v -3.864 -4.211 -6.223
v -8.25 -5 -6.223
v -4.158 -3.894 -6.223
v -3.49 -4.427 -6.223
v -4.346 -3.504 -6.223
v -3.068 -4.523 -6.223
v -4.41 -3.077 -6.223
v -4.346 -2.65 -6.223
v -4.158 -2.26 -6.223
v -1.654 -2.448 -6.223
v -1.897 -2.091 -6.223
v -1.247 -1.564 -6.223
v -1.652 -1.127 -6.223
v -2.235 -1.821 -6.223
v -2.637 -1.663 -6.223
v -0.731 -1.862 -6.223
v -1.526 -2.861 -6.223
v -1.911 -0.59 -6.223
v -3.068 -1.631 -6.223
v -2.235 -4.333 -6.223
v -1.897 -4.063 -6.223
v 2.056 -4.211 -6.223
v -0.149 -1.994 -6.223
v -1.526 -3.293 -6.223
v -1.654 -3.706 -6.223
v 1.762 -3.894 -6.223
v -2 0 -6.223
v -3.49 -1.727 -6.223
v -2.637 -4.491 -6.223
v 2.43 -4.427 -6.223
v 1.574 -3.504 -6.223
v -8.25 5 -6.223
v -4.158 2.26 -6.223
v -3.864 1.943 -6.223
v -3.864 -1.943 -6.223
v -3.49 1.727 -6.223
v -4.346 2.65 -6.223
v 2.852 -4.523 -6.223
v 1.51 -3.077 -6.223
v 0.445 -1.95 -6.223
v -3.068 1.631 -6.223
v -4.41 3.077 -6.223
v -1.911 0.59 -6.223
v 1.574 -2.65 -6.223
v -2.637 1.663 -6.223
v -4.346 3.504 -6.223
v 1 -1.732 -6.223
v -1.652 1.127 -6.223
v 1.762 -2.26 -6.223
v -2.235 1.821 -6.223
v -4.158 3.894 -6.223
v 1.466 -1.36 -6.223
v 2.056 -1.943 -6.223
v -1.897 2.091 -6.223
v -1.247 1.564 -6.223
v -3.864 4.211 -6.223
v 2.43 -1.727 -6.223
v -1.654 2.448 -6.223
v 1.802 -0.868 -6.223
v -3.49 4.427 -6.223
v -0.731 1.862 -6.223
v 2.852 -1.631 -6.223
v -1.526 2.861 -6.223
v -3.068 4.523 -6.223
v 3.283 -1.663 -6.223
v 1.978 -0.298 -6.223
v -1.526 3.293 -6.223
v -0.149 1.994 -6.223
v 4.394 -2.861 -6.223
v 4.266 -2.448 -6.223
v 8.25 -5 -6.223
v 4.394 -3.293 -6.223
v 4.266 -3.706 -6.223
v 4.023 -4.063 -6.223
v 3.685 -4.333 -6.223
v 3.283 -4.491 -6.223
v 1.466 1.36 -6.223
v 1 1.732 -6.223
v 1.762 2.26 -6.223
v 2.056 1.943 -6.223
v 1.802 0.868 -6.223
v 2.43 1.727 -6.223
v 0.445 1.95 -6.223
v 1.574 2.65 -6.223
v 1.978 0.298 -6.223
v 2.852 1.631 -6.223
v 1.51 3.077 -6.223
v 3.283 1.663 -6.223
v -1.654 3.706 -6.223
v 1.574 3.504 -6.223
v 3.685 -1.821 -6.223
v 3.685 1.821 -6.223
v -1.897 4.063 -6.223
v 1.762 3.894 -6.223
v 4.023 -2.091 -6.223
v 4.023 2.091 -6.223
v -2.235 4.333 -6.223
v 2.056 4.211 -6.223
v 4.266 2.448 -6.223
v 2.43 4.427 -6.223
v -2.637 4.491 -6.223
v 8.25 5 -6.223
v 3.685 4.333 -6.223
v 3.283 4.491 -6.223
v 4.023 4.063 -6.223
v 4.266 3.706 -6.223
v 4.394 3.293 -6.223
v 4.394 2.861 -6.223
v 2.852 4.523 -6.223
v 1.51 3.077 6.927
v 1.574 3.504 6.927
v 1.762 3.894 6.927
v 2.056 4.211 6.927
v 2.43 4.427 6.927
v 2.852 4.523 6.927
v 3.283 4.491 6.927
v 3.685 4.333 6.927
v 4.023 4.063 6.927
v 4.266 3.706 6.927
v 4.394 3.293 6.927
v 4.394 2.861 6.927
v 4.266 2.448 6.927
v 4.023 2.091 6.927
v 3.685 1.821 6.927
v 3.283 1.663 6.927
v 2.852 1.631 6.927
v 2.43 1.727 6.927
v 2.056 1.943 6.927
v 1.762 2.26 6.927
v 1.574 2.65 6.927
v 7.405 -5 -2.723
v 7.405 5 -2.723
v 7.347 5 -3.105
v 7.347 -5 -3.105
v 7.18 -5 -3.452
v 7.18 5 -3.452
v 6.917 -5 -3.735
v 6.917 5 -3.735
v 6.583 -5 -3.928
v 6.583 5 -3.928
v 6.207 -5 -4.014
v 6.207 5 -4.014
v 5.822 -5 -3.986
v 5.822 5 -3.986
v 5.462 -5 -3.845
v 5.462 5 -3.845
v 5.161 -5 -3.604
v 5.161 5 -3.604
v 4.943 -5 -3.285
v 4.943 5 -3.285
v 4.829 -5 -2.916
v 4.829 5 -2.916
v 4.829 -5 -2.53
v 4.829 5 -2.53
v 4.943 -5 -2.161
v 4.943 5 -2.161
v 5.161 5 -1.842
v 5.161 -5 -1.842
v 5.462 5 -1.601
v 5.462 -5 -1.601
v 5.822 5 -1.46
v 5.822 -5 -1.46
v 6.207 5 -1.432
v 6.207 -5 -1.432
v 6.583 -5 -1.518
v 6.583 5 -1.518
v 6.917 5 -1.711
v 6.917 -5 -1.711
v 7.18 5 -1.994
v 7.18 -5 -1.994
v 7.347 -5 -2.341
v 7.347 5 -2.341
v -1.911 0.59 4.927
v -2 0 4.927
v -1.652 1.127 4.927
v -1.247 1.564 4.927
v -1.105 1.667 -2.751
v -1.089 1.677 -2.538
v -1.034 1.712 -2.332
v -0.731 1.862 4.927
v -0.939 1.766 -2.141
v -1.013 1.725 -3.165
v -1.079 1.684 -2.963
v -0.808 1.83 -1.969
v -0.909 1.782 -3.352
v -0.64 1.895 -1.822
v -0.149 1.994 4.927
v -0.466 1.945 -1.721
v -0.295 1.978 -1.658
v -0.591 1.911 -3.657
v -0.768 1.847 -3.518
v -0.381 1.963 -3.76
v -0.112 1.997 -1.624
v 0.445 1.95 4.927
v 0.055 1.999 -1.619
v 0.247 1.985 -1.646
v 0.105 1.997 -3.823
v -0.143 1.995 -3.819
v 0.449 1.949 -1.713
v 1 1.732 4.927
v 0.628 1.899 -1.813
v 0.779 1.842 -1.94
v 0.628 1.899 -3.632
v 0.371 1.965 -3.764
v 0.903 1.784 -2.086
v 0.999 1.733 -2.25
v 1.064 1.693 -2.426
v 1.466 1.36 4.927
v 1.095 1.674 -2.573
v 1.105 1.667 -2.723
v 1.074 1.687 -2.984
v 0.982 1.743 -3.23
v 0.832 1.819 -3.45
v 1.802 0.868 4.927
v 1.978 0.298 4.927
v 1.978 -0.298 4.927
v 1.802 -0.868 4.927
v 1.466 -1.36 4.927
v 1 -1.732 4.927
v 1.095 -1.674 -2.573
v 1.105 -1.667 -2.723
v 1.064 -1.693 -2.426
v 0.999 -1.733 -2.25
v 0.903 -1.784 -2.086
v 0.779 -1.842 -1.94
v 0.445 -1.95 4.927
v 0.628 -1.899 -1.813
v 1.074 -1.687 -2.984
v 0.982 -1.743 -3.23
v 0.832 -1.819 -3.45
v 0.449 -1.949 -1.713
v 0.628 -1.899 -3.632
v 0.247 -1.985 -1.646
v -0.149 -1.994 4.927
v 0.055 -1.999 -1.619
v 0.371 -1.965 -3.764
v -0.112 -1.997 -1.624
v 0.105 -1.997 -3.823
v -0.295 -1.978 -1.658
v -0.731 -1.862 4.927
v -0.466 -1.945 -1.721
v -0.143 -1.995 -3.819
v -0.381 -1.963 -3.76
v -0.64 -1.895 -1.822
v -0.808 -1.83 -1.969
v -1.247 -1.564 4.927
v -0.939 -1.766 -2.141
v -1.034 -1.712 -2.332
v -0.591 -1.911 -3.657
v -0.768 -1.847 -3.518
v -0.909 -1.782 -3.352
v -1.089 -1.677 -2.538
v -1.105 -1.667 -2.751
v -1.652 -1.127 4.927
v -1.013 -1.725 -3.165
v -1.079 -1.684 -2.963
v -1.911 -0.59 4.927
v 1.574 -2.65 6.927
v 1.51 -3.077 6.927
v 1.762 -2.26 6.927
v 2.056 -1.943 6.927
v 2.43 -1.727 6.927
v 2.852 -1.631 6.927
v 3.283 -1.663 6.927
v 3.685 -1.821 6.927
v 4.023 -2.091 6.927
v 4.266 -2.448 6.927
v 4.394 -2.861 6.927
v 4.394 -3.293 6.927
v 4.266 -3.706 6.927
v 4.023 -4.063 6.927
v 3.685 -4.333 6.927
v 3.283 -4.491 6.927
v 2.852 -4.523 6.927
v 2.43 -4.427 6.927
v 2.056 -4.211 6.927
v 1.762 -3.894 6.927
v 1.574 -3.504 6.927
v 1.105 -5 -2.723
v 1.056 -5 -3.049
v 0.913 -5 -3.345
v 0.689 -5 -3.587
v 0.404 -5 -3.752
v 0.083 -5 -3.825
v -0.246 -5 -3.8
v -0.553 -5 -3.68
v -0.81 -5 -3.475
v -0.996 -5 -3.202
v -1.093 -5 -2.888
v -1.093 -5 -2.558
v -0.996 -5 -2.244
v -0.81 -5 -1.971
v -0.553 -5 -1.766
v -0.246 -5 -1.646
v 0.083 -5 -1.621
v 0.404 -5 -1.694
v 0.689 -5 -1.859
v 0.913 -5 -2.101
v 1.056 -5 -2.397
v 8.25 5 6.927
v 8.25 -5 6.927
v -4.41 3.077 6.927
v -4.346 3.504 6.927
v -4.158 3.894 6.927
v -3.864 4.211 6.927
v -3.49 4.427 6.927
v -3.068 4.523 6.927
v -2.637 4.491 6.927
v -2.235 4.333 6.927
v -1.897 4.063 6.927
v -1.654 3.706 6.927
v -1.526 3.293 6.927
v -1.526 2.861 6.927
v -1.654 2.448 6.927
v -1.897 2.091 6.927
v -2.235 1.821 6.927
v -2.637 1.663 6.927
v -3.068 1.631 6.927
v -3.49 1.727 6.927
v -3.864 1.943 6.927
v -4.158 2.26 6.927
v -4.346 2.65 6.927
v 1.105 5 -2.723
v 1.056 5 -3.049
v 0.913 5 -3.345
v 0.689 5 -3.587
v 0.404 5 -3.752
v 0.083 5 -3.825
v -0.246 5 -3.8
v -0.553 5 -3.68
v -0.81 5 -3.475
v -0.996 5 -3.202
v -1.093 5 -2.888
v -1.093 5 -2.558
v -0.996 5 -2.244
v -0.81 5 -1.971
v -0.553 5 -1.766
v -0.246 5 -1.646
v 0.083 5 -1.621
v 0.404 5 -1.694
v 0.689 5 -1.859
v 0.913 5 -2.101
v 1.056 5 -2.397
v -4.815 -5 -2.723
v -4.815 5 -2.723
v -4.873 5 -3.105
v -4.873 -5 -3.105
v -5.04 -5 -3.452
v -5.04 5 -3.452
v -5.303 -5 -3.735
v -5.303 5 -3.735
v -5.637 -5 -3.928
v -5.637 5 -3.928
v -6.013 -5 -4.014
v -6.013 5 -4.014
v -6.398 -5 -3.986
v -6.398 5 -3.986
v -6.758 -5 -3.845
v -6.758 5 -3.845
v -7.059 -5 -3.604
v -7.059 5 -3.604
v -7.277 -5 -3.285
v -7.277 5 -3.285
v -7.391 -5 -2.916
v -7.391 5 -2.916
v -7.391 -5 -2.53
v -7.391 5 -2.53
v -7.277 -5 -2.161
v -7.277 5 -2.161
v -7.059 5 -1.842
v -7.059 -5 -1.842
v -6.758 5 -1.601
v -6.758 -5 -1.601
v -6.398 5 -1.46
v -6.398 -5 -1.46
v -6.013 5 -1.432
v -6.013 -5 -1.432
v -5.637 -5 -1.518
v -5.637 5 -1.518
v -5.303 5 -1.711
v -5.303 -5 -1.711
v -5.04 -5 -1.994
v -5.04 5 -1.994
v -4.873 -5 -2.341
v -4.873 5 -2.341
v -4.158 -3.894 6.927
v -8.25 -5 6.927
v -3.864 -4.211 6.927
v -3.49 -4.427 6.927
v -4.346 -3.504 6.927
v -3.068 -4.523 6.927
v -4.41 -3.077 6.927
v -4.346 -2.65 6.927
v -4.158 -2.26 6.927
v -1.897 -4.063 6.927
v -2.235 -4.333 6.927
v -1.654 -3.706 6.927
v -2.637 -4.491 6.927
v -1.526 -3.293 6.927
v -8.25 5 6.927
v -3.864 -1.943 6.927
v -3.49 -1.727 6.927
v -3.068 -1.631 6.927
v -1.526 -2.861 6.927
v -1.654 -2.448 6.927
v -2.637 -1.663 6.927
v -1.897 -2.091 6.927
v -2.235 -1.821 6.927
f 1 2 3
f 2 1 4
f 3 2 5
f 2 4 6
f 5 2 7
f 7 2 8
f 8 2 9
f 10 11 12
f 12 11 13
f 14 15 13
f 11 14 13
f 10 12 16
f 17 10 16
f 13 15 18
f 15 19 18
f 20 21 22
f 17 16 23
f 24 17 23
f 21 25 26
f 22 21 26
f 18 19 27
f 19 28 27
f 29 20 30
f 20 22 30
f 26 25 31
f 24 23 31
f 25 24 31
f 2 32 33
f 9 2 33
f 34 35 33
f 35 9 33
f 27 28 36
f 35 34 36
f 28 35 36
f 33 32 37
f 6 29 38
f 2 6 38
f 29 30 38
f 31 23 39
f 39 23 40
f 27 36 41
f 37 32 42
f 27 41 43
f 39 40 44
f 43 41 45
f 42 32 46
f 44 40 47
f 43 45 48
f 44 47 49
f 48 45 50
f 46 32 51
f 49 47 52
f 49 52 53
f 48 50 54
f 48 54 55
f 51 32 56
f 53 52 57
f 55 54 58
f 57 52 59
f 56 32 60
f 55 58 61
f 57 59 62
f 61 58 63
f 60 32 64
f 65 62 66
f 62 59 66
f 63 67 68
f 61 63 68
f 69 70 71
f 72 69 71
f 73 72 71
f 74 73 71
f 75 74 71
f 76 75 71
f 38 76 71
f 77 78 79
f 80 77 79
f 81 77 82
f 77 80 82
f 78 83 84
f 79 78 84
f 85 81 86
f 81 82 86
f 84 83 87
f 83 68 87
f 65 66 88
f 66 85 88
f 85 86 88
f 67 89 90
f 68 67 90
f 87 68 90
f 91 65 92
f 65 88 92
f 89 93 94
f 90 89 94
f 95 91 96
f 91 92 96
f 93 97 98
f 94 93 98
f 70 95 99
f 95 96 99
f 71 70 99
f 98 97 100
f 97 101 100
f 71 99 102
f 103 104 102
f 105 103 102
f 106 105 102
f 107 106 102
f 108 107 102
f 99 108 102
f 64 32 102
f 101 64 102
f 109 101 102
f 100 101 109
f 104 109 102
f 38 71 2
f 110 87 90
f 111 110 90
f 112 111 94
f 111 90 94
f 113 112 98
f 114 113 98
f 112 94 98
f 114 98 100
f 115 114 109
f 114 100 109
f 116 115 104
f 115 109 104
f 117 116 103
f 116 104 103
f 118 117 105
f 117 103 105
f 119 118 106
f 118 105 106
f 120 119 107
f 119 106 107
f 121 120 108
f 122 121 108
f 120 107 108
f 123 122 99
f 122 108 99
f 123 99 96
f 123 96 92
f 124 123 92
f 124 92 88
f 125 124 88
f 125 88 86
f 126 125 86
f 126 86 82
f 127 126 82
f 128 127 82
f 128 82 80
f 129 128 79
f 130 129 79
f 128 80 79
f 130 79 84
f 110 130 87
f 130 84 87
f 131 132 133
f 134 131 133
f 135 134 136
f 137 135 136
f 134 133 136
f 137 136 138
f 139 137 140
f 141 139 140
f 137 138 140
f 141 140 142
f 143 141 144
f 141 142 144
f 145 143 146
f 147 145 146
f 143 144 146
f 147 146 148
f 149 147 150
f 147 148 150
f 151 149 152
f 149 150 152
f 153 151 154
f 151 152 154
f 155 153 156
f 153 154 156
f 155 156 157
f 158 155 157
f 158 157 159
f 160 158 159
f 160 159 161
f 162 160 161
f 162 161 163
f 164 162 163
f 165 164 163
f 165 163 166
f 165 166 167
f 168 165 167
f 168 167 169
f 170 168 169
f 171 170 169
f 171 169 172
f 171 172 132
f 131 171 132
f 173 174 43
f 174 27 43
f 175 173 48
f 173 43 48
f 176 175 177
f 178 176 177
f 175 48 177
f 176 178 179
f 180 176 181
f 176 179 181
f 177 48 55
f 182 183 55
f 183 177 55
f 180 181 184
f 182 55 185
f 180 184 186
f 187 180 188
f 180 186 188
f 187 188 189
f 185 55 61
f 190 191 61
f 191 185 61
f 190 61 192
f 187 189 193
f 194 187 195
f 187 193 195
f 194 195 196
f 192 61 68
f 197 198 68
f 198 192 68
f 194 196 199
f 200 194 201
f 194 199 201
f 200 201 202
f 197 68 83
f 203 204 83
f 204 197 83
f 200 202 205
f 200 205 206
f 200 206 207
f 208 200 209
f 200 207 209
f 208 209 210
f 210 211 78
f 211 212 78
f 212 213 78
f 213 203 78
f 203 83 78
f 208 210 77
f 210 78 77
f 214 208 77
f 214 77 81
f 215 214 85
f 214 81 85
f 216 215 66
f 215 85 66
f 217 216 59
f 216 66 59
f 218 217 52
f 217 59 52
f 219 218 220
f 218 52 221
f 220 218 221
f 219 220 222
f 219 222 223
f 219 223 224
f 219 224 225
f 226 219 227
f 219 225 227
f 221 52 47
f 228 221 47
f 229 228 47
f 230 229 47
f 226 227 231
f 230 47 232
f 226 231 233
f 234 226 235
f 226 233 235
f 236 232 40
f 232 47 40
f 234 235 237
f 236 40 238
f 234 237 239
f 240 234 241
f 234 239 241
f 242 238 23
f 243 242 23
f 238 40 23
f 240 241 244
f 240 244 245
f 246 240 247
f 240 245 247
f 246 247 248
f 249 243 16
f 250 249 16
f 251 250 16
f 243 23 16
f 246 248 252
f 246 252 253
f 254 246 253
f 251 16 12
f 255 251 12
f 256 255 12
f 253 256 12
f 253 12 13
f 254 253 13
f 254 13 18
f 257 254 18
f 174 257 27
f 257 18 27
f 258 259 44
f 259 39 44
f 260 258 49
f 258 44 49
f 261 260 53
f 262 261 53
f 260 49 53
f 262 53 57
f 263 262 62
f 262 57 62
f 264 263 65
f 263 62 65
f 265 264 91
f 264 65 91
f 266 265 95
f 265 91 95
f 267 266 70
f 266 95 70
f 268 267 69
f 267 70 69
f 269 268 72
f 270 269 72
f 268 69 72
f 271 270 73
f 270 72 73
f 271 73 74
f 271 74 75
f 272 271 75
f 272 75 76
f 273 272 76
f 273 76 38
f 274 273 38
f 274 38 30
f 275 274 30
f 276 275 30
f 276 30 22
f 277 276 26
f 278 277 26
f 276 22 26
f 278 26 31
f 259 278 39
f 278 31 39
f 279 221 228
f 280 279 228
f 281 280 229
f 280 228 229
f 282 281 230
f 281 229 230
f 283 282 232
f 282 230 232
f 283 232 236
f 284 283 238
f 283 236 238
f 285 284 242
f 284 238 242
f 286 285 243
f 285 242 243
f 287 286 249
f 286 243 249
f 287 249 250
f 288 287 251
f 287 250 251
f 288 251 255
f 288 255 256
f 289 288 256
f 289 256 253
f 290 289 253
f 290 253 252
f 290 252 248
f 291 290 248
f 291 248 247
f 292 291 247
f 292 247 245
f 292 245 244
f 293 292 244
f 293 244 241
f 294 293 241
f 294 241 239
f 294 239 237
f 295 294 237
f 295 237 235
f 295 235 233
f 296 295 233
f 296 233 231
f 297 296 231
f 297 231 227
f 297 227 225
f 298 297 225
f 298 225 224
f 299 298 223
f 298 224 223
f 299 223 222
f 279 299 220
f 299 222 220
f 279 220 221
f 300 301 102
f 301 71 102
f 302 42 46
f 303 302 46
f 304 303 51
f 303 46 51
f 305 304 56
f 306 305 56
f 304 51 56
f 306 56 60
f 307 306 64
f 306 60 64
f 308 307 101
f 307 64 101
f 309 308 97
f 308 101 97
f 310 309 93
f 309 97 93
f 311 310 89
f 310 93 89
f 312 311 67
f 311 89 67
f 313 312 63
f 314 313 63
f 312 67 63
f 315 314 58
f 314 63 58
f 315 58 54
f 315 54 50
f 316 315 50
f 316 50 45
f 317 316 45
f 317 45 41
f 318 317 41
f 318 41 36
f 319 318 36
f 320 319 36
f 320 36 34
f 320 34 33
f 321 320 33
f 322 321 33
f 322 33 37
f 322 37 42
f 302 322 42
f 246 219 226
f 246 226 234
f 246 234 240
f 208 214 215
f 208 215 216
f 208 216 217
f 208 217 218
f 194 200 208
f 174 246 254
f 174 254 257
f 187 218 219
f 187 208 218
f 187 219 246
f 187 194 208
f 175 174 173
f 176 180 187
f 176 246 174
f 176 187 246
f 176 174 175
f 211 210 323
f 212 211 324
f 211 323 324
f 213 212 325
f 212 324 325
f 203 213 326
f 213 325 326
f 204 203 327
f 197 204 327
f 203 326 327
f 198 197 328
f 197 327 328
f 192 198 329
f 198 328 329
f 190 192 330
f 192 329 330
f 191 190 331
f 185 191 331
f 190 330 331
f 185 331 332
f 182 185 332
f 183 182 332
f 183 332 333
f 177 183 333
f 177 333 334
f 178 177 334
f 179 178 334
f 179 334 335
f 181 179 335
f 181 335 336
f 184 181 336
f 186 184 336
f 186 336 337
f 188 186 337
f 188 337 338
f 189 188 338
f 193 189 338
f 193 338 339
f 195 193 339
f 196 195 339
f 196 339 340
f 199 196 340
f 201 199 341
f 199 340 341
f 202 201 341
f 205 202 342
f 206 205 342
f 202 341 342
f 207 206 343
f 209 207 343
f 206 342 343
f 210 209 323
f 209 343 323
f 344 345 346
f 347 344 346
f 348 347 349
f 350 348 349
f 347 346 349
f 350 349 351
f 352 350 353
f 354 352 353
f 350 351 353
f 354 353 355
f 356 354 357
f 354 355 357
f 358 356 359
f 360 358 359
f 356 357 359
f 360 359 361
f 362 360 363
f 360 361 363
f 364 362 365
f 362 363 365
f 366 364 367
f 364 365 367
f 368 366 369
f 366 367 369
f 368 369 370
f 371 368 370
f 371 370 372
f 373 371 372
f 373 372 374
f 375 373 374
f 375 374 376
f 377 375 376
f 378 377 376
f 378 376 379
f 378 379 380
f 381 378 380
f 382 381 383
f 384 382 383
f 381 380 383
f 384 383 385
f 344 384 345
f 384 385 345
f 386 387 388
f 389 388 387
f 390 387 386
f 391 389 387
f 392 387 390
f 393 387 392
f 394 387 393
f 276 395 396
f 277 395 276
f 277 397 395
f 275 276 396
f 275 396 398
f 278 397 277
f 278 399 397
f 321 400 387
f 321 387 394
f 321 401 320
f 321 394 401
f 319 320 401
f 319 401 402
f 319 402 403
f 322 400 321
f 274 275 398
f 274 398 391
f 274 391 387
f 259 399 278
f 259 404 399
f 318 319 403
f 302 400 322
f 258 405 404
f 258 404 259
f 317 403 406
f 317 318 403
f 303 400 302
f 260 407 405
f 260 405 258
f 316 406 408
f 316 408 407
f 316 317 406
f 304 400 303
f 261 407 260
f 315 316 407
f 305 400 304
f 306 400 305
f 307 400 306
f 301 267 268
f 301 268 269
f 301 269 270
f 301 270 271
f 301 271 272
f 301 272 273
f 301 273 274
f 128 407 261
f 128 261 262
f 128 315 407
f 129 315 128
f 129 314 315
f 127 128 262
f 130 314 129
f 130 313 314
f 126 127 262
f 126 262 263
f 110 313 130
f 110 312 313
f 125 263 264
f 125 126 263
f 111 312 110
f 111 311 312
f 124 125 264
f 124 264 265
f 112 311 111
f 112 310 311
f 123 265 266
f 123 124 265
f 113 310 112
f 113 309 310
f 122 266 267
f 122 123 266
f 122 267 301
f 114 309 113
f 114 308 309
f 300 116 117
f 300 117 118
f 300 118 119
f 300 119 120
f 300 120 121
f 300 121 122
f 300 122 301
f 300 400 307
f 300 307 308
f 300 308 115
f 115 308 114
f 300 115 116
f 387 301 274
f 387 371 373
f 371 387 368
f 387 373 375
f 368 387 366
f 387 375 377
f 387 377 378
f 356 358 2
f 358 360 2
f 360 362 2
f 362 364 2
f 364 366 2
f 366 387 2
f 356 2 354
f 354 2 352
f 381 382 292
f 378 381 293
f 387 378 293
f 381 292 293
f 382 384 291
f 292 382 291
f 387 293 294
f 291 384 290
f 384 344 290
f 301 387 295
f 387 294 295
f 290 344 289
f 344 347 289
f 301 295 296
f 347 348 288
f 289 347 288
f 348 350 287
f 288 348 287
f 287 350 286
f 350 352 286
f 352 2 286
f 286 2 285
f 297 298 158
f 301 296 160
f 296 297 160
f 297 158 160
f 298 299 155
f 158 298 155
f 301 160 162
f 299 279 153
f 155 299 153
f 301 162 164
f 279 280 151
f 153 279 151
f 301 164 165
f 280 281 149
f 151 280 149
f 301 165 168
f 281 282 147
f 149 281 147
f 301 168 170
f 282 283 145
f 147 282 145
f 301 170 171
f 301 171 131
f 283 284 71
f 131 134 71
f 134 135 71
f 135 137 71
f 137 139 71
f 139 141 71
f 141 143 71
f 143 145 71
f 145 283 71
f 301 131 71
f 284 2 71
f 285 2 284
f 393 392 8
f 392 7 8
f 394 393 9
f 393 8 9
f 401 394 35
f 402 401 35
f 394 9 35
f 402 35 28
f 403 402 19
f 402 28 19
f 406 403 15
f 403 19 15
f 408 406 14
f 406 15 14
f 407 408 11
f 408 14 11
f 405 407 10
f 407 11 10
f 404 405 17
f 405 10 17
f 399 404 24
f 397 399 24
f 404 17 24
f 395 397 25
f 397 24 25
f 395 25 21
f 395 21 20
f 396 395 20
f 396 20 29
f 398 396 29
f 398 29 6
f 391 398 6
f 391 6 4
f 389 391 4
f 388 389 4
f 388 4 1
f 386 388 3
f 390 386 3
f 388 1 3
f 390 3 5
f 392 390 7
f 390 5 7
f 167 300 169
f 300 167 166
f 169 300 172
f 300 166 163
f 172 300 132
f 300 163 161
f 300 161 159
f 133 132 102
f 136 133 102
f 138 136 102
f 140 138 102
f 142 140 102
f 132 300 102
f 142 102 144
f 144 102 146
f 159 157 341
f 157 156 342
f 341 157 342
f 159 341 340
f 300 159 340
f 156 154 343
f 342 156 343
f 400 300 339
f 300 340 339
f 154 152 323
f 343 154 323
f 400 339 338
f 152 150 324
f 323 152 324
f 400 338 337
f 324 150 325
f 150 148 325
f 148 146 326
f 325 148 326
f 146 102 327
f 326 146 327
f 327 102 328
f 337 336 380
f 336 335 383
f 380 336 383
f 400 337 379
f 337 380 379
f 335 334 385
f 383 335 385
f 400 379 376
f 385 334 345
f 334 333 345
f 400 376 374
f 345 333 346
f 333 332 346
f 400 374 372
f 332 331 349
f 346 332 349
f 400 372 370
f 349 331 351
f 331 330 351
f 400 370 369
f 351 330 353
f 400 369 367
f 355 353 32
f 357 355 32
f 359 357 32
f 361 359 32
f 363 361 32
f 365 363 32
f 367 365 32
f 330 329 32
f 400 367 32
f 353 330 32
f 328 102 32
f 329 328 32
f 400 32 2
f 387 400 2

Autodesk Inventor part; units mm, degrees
ref_plane "YZ Plane" through (0, 0, 0) normal (1, 0, 0) x (0, 1, 0)
ref_plane "XZ Plane" through (0, 0, 0) normal (0, 1, 0) x (-1, 0, 0)
ref_plane "XY Plane" through (0, 0, 0) normal (0, 0, 1) x (1, 0, 0)
sketch "Sketch1" plane through (0, 0, 0) normal (0, 0, 1) x (1, 0, 0)
  line L0 (8.25, 5) -> (-8.25, 5)
  line L1 (-8.25, 5) -> (-8.25, -5)
  line L2 (-8.25, -5) -> (8.25, -5)
  line L3 (8.25, -5) -> (8.25, 5)
  point P0 (0, 0)
  dimension "d19" = 10
  dimension "d36" = 16.5
  dimension "d37" = 5
extrude "Box" add sketch "Sketch1" along normal blind 6.927 and the other way blind 6.223
sketch "Sketch3" plane through (0, 0, -6.223) normal (0, 0, -1) x (-1, 0, 0)
  line L0 (-5.08, 0) -> (5.08, 0) construction
  line L1 (-4.75, 0) -> (4.75, 0) construction
  circle A0 centre (0, 0) radius 2
  dimension "d35" = 4
extrude "Slot" cut sketch "Sketch3" against normal blind 11.15
sketch "Sketch4" plane through (0, 0, -6.223) normal (0, 0, -1) x (-1, 0, 0)
  circle A0 centre (-2.96, 3.0769) radius 1.45
  line L0 (8.25, 5) -> (-8.25, 5) projected
  circle A1 centre (0, 0) radius 2 projected
  line L1 (-8.25, 5) -> (-8.25, -5) projected
  dimension "d32" = 2.9
  dimension "d34" = 1.9231
  dimension "d39" = 5.29
  dimension "d40" = 5
extrude "MountingHole" cut sketch "Sketch4" against normal blind 15 contours A0
pattern_linear "Mounting Holes" count 2 spacing 5.92 along (-1, 0, 0) count 2 spacing 6.154 along (0, -1, 0) of "MountingHole"
sketch "Sketch6" plane through (-8.25, 5, 6.927) normal (0, 1, 0) x (1, 0, 0)
  circle A0 centre (8.25, 9.65) radius 1.105
  line L0 (0, 13.15) -> (16.5, 13.15) projected
  dimension "d20" = 2.21
  dimension "d46" = 3.5
extrude "CentralSMAHole" cut sketch "Sketch6" against normal blind 12
sketch "Sketch8" plane through (-8.25, 5, 6.927) normal (0, 1, 0) x (1, 0, 0)
  circle A0 centre (14.36, 9.65) radius 1.295
  line L0 (0, 13.15) -> (16.5, 13.15) projected
  dimension "d23" = 2.59
  dimension "d45" = 3.5
extrude "SMAMounting" cut sketch "Sketch8" against normal blind 12
pattern_linear "SMAMountingHoles" count 2 spacing 12.22 along (-1, 0, 0) of "SMAMounting"
equation "\"d37\" = 0.5 * d19"
equation "\"d34\" = 0.384615 * d40"
properties part number "NewSinkV3"
